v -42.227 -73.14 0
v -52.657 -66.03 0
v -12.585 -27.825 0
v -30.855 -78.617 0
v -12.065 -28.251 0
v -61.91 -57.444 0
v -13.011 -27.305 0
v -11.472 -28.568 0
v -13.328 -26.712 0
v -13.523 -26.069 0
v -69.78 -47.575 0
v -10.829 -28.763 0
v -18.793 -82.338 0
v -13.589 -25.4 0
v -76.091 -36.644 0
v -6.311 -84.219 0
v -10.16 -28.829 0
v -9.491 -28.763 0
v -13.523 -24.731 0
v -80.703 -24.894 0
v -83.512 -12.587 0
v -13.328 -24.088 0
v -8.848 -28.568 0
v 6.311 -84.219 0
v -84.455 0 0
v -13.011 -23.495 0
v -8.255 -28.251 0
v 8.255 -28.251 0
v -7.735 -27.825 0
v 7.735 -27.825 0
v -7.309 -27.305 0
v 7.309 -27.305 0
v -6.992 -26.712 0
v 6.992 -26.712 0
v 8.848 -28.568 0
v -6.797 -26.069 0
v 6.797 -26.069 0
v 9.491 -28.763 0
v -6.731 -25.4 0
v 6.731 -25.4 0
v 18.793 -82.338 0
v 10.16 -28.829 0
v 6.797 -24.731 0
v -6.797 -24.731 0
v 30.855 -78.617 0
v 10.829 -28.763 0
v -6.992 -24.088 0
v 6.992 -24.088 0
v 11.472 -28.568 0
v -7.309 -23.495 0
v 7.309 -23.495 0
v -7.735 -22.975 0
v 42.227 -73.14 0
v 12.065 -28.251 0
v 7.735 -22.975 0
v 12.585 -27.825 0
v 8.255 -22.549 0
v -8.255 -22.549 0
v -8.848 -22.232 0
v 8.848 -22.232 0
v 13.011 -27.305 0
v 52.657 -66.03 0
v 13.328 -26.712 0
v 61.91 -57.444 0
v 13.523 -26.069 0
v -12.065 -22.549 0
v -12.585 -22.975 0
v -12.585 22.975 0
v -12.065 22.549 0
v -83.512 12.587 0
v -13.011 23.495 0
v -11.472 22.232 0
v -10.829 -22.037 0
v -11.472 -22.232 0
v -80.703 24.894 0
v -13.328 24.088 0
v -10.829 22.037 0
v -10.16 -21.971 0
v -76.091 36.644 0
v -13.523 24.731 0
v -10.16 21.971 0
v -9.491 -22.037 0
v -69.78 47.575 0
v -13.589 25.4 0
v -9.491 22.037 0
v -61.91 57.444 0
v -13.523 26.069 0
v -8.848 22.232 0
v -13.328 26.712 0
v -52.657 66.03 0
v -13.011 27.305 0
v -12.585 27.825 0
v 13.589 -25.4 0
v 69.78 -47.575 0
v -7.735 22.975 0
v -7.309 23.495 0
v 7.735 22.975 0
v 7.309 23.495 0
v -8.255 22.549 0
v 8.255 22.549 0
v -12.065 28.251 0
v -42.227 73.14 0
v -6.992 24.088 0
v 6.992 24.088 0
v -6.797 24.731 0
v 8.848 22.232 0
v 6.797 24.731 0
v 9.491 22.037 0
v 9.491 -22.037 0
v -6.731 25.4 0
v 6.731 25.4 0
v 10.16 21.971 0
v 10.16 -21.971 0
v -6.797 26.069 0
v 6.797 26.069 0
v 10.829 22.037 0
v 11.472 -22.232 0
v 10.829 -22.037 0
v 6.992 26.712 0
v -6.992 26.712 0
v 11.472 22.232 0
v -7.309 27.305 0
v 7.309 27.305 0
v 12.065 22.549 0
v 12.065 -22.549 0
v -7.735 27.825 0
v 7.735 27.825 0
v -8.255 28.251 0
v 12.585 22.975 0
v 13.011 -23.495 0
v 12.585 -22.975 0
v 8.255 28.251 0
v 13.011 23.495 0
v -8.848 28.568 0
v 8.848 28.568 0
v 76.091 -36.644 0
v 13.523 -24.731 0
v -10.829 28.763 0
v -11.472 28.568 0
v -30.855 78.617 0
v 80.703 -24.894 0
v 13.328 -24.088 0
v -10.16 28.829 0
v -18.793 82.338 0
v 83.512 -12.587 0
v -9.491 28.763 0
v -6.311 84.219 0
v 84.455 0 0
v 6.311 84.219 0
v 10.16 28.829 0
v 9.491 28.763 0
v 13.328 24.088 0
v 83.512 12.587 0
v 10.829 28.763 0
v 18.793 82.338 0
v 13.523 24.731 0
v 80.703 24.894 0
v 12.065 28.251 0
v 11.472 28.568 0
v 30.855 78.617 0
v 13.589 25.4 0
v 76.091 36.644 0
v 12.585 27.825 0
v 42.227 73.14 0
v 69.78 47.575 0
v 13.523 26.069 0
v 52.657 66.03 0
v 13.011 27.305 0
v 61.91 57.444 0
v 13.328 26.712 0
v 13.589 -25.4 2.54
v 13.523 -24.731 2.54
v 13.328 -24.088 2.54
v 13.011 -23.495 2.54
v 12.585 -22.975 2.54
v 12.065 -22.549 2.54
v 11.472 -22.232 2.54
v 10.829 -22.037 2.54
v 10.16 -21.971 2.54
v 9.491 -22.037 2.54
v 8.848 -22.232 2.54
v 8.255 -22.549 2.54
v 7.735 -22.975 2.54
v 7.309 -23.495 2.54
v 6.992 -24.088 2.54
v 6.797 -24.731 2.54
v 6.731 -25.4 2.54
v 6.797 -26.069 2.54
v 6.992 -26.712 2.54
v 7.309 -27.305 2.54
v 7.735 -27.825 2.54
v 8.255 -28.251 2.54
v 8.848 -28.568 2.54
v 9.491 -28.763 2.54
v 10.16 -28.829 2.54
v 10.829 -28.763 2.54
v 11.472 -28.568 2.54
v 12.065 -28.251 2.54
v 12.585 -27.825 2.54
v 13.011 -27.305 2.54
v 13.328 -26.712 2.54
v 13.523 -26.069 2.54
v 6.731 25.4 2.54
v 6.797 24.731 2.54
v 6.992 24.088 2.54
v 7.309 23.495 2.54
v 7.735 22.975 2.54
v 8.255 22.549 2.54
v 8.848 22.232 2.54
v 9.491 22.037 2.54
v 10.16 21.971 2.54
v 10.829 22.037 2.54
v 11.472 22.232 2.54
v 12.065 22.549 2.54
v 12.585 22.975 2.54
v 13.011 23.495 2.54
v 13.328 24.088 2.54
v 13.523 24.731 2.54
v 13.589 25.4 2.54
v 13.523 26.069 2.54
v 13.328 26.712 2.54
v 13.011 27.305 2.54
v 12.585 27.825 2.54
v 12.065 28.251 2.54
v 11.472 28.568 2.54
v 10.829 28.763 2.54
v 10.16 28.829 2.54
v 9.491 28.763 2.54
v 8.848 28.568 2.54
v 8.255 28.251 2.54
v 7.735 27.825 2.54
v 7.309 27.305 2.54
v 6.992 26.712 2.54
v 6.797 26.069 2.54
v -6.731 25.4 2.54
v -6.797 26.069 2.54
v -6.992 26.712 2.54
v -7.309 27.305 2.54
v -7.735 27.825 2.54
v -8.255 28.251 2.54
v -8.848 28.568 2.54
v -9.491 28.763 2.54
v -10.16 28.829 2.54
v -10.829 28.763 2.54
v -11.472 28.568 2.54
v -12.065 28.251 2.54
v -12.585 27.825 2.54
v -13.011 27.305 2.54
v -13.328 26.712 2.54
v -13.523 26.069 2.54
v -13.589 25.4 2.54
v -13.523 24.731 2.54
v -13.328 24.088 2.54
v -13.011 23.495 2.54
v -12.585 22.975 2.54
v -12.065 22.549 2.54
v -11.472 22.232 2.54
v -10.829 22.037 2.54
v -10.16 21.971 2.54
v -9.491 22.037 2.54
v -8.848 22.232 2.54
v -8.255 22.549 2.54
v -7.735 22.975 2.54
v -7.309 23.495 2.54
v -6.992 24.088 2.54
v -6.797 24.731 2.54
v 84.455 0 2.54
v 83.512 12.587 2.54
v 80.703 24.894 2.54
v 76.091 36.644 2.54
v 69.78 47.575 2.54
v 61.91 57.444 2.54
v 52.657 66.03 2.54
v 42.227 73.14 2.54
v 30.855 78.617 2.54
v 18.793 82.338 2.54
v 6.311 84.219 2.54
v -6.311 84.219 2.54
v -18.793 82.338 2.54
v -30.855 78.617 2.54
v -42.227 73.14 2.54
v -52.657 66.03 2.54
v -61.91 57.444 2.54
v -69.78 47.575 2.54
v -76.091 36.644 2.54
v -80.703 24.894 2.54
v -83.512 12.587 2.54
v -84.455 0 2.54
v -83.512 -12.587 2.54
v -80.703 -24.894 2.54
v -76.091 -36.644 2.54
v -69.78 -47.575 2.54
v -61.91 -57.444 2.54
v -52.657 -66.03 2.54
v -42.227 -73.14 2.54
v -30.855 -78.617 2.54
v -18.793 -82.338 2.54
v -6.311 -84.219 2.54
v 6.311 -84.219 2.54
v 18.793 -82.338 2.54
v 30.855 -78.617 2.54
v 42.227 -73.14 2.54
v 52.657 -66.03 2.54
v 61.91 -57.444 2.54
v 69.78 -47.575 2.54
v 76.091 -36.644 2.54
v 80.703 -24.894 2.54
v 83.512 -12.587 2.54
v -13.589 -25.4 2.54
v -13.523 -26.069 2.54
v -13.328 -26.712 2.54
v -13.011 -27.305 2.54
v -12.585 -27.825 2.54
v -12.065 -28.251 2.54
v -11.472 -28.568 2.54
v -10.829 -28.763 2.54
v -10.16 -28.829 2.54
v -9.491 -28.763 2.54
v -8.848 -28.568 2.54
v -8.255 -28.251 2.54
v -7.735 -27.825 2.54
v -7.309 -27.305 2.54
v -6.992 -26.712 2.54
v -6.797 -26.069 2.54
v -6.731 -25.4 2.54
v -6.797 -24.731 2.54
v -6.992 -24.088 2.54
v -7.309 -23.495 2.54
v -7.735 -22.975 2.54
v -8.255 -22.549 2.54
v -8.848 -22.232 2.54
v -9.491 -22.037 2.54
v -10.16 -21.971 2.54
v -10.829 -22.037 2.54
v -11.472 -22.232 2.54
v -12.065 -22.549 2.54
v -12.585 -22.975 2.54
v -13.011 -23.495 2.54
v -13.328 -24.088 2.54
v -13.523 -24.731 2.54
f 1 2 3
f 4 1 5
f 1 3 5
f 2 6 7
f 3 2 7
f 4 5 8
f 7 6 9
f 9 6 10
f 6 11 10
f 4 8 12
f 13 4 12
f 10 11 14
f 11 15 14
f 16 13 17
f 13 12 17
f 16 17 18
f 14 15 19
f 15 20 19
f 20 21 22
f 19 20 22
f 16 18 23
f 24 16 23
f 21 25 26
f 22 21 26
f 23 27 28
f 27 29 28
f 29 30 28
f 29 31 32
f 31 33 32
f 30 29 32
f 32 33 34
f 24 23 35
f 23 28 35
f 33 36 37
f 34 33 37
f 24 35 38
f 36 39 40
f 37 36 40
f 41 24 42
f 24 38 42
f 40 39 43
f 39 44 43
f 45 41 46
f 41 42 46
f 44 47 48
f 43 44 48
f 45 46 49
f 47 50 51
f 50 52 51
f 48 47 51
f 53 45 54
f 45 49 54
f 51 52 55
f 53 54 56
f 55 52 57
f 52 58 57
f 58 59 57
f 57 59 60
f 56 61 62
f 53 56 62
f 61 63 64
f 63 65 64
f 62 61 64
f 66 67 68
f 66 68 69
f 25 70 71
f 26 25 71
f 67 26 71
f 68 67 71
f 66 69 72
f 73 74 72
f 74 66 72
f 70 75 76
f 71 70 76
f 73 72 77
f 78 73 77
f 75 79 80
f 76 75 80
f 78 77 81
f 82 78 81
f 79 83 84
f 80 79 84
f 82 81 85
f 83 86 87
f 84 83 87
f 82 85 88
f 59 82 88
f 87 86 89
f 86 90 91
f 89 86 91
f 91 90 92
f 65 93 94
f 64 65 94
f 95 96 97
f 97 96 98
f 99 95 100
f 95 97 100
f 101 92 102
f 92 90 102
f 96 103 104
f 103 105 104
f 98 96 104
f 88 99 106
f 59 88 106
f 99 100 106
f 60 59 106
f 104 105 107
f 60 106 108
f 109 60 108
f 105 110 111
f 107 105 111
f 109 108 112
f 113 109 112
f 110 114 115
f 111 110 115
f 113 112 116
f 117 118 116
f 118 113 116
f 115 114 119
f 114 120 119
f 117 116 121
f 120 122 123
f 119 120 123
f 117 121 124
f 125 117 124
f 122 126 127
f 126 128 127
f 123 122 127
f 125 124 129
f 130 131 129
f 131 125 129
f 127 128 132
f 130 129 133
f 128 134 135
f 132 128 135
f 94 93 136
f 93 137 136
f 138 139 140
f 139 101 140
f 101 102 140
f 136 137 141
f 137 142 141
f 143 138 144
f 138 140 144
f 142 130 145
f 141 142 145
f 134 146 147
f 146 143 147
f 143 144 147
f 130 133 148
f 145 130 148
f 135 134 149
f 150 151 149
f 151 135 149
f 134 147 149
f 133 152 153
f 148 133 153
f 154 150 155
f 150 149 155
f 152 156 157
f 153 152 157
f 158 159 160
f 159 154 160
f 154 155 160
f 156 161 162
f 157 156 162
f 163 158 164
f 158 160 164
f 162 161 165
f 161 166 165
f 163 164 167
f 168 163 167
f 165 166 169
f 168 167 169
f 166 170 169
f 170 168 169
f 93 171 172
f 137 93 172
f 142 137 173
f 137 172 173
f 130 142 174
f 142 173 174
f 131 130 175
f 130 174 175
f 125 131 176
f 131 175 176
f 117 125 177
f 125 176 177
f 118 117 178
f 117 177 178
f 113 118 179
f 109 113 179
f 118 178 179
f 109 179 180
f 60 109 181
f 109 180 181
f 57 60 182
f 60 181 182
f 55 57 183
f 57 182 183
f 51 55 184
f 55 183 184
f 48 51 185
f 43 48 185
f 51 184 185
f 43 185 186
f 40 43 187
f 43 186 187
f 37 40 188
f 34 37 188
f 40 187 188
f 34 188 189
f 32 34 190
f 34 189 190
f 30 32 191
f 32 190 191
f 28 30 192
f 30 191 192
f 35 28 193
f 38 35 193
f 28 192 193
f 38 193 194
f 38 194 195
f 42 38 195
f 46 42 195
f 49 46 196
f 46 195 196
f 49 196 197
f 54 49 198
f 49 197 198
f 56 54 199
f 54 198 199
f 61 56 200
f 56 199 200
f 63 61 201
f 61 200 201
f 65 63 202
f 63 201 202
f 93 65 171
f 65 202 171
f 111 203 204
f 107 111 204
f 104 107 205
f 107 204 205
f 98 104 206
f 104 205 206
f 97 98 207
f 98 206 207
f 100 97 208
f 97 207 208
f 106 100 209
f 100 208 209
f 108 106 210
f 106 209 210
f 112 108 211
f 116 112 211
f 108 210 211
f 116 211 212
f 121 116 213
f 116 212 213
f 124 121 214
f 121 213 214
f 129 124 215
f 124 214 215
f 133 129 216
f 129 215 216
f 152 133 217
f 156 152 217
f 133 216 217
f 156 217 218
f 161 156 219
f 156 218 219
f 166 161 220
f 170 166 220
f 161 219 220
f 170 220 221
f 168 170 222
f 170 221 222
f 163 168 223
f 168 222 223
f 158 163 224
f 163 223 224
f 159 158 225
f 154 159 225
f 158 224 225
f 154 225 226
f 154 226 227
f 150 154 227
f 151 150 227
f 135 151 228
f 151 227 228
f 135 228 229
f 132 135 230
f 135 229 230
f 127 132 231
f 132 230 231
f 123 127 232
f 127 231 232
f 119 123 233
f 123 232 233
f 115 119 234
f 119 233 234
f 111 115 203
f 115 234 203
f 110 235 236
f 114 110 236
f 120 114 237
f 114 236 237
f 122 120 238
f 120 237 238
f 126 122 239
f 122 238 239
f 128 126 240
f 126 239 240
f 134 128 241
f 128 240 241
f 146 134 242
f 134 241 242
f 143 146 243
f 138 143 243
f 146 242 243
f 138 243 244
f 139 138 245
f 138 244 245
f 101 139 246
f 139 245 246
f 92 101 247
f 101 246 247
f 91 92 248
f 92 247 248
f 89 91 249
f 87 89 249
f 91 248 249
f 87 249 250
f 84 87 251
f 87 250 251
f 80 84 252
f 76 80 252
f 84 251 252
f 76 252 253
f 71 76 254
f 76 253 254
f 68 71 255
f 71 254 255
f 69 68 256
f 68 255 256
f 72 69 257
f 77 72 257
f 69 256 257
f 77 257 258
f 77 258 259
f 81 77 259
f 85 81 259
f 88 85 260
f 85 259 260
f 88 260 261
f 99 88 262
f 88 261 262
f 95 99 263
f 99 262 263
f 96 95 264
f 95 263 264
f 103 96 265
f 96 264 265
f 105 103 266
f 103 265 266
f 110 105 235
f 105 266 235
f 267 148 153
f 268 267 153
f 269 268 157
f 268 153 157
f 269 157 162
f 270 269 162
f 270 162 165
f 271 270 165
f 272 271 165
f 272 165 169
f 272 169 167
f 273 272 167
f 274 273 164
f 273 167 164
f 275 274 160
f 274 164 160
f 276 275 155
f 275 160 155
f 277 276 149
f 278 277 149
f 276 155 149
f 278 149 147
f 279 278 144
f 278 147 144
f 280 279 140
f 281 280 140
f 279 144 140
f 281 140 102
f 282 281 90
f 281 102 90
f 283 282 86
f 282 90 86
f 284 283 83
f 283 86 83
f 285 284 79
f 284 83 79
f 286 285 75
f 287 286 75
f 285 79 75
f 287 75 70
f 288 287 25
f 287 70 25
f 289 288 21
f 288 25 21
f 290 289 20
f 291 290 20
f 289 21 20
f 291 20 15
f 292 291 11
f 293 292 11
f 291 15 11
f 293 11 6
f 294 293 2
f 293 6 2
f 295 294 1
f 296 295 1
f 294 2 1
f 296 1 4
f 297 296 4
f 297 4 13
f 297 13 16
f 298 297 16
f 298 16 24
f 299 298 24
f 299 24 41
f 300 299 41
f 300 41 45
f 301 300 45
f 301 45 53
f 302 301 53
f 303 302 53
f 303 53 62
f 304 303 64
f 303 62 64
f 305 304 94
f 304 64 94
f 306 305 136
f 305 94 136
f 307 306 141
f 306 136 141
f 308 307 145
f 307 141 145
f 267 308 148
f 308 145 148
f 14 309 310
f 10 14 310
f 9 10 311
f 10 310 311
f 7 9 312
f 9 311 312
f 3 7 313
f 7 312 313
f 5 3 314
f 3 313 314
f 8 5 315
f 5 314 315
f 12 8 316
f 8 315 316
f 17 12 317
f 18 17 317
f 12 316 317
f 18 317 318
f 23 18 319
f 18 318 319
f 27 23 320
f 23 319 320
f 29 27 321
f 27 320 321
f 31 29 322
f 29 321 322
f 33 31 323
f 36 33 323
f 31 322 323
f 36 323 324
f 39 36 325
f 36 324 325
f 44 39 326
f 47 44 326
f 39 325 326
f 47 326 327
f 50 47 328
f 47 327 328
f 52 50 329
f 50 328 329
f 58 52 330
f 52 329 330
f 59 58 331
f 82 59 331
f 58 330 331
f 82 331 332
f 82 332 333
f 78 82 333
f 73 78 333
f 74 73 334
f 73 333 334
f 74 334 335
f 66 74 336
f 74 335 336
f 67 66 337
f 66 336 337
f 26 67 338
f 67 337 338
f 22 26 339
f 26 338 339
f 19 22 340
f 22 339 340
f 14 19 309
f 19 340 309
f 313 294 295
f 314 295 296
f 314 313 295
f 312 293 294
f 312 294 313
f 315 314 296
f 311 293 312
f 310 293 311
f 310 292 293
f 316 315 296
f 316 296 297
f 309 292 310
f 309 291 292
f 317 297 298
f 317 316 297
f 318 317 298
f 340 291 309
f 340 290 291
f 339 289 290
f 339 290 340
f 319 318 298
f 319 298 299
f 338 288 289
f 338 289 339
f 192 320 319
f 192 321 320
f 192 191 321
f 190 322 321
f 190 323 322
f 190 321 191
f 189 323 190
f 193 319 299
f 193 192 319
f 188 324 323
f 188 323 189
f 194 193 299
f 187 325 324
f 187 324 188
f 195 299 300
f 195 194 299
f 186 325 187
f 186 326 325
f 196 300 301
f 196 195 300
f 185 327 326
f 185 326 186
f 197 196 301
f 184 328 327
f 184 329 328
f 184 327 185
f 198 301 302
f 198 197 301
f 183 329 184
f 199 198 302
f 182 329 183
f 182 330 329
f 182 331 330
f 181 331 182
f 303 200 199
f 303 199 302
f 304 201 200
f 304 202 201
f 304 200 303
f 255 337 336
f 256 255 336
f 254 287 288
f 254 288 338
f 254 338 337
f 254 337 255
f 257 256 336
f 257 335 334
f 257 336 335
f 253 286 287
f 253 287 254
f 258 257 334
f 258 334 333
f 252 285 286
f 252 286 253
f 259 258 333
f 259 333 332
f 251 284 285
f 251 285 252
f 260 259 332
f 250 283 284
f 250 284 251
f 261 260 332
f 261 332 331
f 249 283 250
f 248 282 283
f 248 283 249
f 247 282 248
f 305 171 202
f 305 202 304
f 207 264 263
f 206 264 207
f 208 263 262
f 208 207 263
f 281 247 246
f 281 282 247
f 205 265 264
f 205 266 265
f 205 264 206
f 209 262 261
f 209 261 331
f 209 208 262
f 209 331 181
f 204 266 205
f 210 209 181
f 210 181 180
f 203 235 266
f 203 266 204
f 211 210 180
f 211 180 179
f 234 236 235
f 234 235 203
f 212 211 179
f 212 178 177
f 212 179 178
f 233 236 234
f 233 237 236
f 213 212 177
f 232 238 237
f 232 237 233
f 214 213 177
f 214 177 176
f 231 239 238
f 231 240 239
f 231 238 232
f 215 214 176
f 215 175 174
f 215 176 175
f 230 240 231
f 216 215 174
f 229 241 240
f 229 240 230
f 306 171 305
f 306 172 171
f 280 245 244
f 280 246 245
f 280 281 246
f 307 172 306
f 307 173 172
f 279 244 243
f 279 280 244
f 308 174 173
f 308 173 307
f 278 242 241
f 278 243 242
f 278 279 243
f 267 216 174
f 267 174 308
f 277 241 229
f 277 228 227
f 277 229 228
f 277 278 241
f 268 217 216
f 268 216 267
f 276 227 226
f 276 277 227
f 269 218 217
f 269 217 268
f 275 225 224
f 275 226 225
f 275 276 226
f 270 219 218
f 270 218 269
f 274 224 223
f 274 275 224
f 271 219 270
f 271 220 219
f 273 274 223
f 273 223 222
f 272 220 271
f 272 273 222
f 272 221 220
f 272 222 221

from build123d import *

# Parameters (mm, degrees)
SKETCH1_R           = 84.455
BOSS_EXTRUDE1_DEPTH = 2.54
SKETCH2_R           = 3.429
CUT_EXTRUDE1_DEPTH  = 2.54


with BuildPart() as part:
    # Sketch1 → Boss-Extrude1 (new body)
    with BuildSketch(Plane.XY):
        Circle(SKETCH1_R)
    extrude(amount=BOSS_EXTRUDE1_DEPTH)

    # Sketch2 → Cut-Extrude1 (cut)
    with BuildSketch(Plane.XY.offset(2.54)):
        with Locations((-10.16, 25.4)):
            Circle(SKETCH2_R)
        with Locations(Location((10.16, 25.4, 0), (0, 0, 180))):
            Circle(SKETCH2_R)
        with Locations((10.16, -25.4)):
            Circle(SKETCH2_R)
        with Locations(Location((-10.16, -25.4, 0), (0, 0, 180))):
            Circle(SKETCH2_R)
    extrude(amount=-CUT_EXTRUDE1_DEPTH, mode=Mode.SUBTRACT)


solid = part.part
